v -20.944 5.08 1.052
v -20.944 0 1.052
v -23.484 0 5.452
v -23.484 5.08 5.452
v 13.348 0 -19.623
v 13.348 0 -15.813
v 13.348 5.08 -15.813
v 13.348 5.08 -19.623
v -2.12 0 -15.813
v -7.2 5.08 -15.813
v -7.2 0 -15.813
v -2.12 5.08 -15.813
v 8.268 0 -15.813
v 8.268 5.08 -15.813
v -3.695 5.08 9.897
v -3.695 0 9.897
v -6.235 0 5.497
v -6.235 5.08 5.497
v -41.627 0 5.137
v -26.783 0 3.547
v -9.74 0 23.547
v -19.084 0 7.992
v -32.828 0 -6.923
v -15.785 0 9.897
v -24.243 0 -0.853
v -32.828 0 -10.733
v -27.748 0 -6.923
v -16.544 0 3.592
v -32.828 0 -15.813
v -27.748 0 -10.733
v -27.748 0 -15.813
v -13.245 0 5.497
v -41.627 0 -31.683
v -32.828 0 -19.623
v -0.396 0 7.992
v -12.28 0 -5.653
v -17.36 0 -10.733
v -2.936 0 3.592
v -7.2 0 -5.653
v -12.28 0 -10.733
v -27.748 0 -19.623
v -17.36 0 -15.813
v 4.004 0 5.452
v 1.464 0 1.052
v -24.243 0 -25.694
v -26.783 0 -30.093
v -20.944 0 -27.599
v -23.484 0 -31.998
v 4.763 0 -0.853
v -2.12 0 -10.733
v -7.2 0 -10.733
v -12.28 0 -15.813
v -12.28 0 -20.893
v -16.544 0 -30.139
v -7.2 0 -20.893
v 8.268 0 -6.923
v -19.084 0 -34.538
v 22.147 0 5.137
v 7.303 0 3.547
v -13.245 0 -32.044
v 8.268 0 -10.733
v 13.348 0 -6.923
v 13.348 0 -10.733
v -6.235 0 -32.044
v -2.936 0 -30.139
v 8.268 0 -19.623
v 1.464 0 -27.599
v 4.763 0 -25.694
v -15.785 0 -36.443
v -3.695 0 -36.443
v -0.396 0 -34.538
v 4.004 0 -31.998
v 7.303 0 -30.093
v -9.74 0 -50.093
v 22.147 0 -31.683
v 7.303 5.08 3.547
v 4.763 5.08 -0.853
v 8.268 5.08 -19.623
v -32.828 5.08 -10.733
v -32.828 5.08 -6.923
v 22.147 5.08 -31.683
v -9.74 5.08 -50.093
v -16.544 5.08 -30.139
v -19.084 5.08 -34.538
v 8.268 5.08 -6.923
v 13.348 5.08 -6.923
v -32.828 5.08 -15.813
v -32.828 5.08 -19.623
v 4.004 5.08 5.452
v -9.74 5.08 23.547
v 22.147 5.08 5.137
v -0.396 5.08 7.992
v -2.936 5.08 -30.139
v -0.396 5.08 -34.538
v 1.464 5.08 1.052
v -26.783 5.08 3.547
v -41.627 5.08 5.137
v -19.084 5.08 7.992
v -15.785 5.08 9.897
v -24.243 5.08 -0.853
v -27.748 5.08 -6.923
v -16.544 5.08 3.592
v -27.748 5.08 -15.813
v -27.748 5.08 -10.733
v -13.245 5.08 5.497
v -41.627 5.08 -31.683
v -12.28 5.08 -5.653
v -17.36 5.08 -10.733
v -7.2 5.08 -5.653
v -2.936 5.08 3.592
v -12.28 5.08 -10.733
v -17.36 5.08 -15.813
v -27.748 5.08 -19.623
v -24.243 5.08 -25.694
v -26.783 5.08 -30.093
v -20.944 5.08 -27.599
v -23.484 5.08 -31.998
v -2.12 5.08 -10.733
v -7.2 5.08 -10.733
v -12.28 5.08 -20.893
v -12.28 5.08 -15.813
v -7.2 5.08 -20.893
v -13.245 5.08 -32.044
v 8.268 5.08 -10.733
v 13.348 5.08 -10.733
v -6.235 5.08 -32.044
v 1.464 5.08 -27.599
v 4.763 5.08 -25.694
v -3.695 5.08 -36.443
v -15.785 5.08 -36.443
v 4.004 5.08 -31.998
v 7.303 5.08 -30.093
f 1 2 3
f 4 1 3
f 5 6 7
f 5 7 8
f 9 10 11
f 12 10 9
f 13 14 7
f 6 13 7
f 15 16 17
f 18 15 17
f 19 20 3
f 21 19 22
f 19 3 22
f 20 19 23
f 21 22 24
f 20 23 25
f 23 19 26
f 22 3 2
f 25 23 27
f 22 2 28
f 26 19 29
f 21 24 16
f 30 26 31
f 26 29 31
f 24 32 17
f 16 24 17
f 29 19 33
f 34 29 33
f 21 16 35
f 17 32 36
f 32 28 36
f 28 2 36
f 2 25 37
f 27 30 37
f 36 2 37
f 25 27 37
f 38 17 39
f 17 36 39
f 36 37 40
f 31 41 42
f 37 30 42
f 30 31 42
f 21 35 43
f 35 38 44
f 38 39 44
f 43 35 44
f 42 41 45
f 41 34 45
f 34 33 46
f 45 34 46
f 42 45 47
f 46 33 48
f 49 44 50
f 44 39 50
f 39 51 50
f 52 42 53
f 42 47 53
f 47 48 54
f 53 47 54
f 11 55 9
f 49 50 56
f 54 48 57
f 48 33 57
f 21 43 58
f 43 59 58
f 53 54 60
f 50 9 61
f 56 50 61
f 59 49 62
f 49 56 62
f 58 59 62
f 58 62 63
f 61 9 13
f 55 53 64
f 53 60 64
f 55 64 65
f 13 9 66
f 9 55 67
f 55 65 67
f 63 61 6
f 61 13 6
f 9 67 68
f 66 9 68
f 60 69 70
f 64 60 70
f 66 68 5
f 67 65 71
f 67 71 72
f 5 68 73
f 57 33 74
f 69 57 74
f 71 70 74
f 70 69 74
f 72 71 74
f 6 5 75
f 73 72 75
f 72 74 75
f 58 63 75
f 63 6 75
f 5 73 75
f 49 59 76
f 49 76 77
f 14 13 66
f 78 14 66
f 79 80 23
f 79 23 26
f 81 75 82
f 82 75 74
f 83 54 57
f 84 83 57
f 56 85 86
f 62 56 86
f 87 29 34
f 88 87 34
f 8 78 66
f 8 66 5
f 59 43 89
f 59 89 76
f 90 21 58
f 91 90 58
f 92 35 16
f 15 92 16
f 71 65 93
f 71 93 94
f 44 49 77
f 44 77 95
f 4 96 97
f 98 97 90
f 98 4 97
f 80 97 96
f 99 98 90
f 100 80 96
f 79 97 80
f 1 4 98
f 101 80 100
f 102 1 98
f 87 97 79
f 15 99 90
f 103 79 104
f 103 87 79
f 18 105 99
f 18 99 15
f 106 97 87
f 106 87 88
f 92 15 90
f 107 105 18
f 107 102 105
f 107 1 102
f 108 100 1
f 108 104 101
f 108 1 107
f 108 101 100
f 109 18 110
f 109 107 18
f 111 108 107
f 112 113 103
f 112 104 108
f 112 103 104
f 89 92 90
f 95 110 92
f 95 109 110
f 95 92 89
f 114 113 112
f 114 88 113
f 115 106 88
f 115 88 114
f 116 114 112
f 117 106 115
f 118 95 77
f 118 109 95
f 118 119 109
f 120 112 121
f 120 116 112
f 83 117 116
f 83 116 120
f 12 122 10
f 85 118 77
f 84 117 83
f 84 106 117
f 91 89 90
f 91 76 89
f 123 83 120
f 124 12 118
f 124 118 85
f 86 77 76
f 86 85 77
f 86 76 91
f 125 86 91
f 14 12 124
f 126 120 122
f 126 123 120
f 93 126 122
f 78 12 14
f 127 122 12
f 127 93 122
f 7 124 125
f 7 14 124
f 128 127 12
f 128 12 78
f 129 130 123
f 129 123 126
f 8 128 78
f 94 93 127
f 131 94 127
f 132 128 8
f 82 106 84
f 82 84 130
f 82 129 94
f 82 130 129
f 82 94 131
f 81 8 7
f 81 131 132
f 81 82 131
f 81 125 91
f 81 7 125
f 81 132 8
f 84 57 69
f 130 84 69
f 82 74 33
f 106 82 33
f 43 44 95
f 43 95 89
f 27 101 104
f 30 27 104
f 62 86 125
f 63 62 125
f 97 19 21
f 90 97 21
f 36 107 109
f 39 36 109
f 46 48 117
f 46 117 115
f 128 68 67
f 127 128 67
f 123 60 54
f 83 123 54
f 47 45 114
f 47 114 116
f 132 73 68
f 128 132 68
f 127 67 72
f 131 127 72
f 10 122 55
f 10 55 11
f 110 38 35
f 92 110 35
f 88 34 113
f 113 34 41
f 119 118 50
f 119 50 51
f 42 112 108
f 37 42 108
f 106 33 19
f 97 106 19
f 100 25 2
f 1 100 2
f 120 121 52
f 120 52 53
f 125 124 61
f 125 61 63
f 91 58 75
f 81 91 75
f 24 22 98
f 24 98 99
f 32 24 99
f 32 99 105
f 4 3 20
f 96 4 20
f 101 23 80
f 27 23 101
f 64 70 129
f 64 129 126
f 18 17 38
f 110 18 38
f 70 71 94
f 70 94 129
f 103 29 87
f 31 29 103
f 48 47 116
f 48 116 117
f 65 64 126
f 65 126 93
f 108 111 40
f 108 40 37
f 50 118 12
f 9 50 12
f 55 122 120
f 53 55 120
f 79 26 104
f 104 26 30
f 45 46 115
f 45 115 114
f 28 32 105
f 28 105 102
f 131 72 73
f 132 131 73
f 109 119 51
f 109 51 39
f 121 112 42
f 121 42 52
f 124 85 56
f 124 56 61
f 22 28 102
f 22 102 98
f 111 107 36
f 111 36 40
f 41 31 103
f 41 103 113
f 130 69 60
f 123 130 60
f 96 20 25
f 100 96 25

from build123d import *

# Parameters (mm, degrees)
SKETCH1_W           = 5.08
SKETCH1_H           = 3.81
BOSS_EXTRUDE1_DEPTH = 5.08
CUT_EXTRUDE1_DEPTH  = 5.08


with BuildPart() as part:
    # Sketch1 → Boss-Extrude1 (new body)
    with BuildSketch(Plane(origin=(0, 0, 0), x_dir=(1, 0, 0), z_dir=(0, 1, 0))):
        Polygon((-41.626929972, -5.1367648), (-9.740013168, -23.5466848), (22.146903635, -5.1367648), (22.146903635, 31.6830752), (-9.740013168, 50.0929952), (-41.626929972, 31.6830752), align=None)
        Polygon((-15.784801205, 36.4430352), (-13.244801205, 32.043626149), (-16.544357993, 30.138626149), (-19.084357993, 34.5380352), align=None, mode=Mode.SUBTRACT)
        with Locations((-30.288111869, 17.7181552)):
            Rectangle(SKETCH1_W, SKETCH1_H, mode=Mode.SUBTRACT)
        with Locations((-30.288111869, 8.8281552)):
            Rectangle(SKETCH1_W, SKETCH1_H, mode=Mode.SUBTRACT)
        Polygon((-26.783323833, 30.0930352), (-24.243323833, 25.693626149), (-20.943767044, 27.598626149), (-23.483767044, 31.9980352), align=None, mode=Mode.SUBTRACT)
        Polygon((7.303297496, 30.0930352), (4.763297496, 25.693626149), (1.463740708, 27.598626149), (4.003740708, 31.9980352), align=None, mode=Mode.SUBTRACT)
        Polygon((-3.695225132, 36.4430352), (-6.235225132, 32.043626149), (-2.935668344, 30.138626149), (-0.395668344, 34.5380352), align=None, mode=Mode.SUBTRACT)
        with Locations((10.808085532, 8.8281552)):
            Rectangle(SKETCH1_W, SKETCH1_H, mode=Mode.SUBTRACT)
        with Locations((10.808085532, 17.7181552)):
            Rectangle(SKETCH1_W, SKETCH1_H, mode=Mode.SUBTRACT)
        Polygon((-3.695225132, -9.8967248), (-6.235225132, -5.497315749), (-2.935668344, -3.592315749), (-0.395668344, -7.9917248), align=None, mode=Mode.SUBTRACT)
        Polygon((7.303297496, -3.5467248), (4.763297496, 0.852684251), (1.463740708, -1.052315749), (4.003740708, -5.4517248), align=None, mode=Mode.SUBTRACT)
        Polygon((-26.783323833, -3.5467248), (-24.243323833, 0.852684251), (-20.943767044, -1.052315749), (-23.483767044, -5.4517248), align=None, mode=Mode.SUBTRACT)
        Polygon((-15.784801205, -9.8967248), (-13.244801205, -5.497315749), (-16.544357993, -3.592315749), (-19.084357993, -7.9917248), align=None, mode=Mode.SUBTRACT)
    extrude(amount=BOSS_EXTRUDE1_DEPTH)

    # Sketch2 → Cut-Extrude1 (cut)
    with BuildSketch(Plane(origin=(0, 5.08, 0), x_dir=(1, 0, 0), z_dir=(0, 1, 0))):
        Polygon((-12.280013168, 20.8931552), (-9.740013168, 20.8931552), (-7.200013168, 20.8931552), (-7.200013168, 15.8131552), (-2.120013168, 15.8131552), (-2.120013168, 13.2731552), (-2.120013168, 10.7331552), (-7.200013168, 10.7331552), (-7.200013168, 5.6531552), (-9.740013168, 5.6531552), (-12.280013168, 5.6531552), (-12.280013168, 10.7331552), (-17.360013168, 10.7331552), (-17.360013168, 13.2731552), (-17.360013168, 15.8131552), (-12.280013168, 15.8131552), align=None)
    extrude(amount=-CUT_EXTRUDE1_DEPTH, mode=Mode.SUBTRACT)


solid = part.part
